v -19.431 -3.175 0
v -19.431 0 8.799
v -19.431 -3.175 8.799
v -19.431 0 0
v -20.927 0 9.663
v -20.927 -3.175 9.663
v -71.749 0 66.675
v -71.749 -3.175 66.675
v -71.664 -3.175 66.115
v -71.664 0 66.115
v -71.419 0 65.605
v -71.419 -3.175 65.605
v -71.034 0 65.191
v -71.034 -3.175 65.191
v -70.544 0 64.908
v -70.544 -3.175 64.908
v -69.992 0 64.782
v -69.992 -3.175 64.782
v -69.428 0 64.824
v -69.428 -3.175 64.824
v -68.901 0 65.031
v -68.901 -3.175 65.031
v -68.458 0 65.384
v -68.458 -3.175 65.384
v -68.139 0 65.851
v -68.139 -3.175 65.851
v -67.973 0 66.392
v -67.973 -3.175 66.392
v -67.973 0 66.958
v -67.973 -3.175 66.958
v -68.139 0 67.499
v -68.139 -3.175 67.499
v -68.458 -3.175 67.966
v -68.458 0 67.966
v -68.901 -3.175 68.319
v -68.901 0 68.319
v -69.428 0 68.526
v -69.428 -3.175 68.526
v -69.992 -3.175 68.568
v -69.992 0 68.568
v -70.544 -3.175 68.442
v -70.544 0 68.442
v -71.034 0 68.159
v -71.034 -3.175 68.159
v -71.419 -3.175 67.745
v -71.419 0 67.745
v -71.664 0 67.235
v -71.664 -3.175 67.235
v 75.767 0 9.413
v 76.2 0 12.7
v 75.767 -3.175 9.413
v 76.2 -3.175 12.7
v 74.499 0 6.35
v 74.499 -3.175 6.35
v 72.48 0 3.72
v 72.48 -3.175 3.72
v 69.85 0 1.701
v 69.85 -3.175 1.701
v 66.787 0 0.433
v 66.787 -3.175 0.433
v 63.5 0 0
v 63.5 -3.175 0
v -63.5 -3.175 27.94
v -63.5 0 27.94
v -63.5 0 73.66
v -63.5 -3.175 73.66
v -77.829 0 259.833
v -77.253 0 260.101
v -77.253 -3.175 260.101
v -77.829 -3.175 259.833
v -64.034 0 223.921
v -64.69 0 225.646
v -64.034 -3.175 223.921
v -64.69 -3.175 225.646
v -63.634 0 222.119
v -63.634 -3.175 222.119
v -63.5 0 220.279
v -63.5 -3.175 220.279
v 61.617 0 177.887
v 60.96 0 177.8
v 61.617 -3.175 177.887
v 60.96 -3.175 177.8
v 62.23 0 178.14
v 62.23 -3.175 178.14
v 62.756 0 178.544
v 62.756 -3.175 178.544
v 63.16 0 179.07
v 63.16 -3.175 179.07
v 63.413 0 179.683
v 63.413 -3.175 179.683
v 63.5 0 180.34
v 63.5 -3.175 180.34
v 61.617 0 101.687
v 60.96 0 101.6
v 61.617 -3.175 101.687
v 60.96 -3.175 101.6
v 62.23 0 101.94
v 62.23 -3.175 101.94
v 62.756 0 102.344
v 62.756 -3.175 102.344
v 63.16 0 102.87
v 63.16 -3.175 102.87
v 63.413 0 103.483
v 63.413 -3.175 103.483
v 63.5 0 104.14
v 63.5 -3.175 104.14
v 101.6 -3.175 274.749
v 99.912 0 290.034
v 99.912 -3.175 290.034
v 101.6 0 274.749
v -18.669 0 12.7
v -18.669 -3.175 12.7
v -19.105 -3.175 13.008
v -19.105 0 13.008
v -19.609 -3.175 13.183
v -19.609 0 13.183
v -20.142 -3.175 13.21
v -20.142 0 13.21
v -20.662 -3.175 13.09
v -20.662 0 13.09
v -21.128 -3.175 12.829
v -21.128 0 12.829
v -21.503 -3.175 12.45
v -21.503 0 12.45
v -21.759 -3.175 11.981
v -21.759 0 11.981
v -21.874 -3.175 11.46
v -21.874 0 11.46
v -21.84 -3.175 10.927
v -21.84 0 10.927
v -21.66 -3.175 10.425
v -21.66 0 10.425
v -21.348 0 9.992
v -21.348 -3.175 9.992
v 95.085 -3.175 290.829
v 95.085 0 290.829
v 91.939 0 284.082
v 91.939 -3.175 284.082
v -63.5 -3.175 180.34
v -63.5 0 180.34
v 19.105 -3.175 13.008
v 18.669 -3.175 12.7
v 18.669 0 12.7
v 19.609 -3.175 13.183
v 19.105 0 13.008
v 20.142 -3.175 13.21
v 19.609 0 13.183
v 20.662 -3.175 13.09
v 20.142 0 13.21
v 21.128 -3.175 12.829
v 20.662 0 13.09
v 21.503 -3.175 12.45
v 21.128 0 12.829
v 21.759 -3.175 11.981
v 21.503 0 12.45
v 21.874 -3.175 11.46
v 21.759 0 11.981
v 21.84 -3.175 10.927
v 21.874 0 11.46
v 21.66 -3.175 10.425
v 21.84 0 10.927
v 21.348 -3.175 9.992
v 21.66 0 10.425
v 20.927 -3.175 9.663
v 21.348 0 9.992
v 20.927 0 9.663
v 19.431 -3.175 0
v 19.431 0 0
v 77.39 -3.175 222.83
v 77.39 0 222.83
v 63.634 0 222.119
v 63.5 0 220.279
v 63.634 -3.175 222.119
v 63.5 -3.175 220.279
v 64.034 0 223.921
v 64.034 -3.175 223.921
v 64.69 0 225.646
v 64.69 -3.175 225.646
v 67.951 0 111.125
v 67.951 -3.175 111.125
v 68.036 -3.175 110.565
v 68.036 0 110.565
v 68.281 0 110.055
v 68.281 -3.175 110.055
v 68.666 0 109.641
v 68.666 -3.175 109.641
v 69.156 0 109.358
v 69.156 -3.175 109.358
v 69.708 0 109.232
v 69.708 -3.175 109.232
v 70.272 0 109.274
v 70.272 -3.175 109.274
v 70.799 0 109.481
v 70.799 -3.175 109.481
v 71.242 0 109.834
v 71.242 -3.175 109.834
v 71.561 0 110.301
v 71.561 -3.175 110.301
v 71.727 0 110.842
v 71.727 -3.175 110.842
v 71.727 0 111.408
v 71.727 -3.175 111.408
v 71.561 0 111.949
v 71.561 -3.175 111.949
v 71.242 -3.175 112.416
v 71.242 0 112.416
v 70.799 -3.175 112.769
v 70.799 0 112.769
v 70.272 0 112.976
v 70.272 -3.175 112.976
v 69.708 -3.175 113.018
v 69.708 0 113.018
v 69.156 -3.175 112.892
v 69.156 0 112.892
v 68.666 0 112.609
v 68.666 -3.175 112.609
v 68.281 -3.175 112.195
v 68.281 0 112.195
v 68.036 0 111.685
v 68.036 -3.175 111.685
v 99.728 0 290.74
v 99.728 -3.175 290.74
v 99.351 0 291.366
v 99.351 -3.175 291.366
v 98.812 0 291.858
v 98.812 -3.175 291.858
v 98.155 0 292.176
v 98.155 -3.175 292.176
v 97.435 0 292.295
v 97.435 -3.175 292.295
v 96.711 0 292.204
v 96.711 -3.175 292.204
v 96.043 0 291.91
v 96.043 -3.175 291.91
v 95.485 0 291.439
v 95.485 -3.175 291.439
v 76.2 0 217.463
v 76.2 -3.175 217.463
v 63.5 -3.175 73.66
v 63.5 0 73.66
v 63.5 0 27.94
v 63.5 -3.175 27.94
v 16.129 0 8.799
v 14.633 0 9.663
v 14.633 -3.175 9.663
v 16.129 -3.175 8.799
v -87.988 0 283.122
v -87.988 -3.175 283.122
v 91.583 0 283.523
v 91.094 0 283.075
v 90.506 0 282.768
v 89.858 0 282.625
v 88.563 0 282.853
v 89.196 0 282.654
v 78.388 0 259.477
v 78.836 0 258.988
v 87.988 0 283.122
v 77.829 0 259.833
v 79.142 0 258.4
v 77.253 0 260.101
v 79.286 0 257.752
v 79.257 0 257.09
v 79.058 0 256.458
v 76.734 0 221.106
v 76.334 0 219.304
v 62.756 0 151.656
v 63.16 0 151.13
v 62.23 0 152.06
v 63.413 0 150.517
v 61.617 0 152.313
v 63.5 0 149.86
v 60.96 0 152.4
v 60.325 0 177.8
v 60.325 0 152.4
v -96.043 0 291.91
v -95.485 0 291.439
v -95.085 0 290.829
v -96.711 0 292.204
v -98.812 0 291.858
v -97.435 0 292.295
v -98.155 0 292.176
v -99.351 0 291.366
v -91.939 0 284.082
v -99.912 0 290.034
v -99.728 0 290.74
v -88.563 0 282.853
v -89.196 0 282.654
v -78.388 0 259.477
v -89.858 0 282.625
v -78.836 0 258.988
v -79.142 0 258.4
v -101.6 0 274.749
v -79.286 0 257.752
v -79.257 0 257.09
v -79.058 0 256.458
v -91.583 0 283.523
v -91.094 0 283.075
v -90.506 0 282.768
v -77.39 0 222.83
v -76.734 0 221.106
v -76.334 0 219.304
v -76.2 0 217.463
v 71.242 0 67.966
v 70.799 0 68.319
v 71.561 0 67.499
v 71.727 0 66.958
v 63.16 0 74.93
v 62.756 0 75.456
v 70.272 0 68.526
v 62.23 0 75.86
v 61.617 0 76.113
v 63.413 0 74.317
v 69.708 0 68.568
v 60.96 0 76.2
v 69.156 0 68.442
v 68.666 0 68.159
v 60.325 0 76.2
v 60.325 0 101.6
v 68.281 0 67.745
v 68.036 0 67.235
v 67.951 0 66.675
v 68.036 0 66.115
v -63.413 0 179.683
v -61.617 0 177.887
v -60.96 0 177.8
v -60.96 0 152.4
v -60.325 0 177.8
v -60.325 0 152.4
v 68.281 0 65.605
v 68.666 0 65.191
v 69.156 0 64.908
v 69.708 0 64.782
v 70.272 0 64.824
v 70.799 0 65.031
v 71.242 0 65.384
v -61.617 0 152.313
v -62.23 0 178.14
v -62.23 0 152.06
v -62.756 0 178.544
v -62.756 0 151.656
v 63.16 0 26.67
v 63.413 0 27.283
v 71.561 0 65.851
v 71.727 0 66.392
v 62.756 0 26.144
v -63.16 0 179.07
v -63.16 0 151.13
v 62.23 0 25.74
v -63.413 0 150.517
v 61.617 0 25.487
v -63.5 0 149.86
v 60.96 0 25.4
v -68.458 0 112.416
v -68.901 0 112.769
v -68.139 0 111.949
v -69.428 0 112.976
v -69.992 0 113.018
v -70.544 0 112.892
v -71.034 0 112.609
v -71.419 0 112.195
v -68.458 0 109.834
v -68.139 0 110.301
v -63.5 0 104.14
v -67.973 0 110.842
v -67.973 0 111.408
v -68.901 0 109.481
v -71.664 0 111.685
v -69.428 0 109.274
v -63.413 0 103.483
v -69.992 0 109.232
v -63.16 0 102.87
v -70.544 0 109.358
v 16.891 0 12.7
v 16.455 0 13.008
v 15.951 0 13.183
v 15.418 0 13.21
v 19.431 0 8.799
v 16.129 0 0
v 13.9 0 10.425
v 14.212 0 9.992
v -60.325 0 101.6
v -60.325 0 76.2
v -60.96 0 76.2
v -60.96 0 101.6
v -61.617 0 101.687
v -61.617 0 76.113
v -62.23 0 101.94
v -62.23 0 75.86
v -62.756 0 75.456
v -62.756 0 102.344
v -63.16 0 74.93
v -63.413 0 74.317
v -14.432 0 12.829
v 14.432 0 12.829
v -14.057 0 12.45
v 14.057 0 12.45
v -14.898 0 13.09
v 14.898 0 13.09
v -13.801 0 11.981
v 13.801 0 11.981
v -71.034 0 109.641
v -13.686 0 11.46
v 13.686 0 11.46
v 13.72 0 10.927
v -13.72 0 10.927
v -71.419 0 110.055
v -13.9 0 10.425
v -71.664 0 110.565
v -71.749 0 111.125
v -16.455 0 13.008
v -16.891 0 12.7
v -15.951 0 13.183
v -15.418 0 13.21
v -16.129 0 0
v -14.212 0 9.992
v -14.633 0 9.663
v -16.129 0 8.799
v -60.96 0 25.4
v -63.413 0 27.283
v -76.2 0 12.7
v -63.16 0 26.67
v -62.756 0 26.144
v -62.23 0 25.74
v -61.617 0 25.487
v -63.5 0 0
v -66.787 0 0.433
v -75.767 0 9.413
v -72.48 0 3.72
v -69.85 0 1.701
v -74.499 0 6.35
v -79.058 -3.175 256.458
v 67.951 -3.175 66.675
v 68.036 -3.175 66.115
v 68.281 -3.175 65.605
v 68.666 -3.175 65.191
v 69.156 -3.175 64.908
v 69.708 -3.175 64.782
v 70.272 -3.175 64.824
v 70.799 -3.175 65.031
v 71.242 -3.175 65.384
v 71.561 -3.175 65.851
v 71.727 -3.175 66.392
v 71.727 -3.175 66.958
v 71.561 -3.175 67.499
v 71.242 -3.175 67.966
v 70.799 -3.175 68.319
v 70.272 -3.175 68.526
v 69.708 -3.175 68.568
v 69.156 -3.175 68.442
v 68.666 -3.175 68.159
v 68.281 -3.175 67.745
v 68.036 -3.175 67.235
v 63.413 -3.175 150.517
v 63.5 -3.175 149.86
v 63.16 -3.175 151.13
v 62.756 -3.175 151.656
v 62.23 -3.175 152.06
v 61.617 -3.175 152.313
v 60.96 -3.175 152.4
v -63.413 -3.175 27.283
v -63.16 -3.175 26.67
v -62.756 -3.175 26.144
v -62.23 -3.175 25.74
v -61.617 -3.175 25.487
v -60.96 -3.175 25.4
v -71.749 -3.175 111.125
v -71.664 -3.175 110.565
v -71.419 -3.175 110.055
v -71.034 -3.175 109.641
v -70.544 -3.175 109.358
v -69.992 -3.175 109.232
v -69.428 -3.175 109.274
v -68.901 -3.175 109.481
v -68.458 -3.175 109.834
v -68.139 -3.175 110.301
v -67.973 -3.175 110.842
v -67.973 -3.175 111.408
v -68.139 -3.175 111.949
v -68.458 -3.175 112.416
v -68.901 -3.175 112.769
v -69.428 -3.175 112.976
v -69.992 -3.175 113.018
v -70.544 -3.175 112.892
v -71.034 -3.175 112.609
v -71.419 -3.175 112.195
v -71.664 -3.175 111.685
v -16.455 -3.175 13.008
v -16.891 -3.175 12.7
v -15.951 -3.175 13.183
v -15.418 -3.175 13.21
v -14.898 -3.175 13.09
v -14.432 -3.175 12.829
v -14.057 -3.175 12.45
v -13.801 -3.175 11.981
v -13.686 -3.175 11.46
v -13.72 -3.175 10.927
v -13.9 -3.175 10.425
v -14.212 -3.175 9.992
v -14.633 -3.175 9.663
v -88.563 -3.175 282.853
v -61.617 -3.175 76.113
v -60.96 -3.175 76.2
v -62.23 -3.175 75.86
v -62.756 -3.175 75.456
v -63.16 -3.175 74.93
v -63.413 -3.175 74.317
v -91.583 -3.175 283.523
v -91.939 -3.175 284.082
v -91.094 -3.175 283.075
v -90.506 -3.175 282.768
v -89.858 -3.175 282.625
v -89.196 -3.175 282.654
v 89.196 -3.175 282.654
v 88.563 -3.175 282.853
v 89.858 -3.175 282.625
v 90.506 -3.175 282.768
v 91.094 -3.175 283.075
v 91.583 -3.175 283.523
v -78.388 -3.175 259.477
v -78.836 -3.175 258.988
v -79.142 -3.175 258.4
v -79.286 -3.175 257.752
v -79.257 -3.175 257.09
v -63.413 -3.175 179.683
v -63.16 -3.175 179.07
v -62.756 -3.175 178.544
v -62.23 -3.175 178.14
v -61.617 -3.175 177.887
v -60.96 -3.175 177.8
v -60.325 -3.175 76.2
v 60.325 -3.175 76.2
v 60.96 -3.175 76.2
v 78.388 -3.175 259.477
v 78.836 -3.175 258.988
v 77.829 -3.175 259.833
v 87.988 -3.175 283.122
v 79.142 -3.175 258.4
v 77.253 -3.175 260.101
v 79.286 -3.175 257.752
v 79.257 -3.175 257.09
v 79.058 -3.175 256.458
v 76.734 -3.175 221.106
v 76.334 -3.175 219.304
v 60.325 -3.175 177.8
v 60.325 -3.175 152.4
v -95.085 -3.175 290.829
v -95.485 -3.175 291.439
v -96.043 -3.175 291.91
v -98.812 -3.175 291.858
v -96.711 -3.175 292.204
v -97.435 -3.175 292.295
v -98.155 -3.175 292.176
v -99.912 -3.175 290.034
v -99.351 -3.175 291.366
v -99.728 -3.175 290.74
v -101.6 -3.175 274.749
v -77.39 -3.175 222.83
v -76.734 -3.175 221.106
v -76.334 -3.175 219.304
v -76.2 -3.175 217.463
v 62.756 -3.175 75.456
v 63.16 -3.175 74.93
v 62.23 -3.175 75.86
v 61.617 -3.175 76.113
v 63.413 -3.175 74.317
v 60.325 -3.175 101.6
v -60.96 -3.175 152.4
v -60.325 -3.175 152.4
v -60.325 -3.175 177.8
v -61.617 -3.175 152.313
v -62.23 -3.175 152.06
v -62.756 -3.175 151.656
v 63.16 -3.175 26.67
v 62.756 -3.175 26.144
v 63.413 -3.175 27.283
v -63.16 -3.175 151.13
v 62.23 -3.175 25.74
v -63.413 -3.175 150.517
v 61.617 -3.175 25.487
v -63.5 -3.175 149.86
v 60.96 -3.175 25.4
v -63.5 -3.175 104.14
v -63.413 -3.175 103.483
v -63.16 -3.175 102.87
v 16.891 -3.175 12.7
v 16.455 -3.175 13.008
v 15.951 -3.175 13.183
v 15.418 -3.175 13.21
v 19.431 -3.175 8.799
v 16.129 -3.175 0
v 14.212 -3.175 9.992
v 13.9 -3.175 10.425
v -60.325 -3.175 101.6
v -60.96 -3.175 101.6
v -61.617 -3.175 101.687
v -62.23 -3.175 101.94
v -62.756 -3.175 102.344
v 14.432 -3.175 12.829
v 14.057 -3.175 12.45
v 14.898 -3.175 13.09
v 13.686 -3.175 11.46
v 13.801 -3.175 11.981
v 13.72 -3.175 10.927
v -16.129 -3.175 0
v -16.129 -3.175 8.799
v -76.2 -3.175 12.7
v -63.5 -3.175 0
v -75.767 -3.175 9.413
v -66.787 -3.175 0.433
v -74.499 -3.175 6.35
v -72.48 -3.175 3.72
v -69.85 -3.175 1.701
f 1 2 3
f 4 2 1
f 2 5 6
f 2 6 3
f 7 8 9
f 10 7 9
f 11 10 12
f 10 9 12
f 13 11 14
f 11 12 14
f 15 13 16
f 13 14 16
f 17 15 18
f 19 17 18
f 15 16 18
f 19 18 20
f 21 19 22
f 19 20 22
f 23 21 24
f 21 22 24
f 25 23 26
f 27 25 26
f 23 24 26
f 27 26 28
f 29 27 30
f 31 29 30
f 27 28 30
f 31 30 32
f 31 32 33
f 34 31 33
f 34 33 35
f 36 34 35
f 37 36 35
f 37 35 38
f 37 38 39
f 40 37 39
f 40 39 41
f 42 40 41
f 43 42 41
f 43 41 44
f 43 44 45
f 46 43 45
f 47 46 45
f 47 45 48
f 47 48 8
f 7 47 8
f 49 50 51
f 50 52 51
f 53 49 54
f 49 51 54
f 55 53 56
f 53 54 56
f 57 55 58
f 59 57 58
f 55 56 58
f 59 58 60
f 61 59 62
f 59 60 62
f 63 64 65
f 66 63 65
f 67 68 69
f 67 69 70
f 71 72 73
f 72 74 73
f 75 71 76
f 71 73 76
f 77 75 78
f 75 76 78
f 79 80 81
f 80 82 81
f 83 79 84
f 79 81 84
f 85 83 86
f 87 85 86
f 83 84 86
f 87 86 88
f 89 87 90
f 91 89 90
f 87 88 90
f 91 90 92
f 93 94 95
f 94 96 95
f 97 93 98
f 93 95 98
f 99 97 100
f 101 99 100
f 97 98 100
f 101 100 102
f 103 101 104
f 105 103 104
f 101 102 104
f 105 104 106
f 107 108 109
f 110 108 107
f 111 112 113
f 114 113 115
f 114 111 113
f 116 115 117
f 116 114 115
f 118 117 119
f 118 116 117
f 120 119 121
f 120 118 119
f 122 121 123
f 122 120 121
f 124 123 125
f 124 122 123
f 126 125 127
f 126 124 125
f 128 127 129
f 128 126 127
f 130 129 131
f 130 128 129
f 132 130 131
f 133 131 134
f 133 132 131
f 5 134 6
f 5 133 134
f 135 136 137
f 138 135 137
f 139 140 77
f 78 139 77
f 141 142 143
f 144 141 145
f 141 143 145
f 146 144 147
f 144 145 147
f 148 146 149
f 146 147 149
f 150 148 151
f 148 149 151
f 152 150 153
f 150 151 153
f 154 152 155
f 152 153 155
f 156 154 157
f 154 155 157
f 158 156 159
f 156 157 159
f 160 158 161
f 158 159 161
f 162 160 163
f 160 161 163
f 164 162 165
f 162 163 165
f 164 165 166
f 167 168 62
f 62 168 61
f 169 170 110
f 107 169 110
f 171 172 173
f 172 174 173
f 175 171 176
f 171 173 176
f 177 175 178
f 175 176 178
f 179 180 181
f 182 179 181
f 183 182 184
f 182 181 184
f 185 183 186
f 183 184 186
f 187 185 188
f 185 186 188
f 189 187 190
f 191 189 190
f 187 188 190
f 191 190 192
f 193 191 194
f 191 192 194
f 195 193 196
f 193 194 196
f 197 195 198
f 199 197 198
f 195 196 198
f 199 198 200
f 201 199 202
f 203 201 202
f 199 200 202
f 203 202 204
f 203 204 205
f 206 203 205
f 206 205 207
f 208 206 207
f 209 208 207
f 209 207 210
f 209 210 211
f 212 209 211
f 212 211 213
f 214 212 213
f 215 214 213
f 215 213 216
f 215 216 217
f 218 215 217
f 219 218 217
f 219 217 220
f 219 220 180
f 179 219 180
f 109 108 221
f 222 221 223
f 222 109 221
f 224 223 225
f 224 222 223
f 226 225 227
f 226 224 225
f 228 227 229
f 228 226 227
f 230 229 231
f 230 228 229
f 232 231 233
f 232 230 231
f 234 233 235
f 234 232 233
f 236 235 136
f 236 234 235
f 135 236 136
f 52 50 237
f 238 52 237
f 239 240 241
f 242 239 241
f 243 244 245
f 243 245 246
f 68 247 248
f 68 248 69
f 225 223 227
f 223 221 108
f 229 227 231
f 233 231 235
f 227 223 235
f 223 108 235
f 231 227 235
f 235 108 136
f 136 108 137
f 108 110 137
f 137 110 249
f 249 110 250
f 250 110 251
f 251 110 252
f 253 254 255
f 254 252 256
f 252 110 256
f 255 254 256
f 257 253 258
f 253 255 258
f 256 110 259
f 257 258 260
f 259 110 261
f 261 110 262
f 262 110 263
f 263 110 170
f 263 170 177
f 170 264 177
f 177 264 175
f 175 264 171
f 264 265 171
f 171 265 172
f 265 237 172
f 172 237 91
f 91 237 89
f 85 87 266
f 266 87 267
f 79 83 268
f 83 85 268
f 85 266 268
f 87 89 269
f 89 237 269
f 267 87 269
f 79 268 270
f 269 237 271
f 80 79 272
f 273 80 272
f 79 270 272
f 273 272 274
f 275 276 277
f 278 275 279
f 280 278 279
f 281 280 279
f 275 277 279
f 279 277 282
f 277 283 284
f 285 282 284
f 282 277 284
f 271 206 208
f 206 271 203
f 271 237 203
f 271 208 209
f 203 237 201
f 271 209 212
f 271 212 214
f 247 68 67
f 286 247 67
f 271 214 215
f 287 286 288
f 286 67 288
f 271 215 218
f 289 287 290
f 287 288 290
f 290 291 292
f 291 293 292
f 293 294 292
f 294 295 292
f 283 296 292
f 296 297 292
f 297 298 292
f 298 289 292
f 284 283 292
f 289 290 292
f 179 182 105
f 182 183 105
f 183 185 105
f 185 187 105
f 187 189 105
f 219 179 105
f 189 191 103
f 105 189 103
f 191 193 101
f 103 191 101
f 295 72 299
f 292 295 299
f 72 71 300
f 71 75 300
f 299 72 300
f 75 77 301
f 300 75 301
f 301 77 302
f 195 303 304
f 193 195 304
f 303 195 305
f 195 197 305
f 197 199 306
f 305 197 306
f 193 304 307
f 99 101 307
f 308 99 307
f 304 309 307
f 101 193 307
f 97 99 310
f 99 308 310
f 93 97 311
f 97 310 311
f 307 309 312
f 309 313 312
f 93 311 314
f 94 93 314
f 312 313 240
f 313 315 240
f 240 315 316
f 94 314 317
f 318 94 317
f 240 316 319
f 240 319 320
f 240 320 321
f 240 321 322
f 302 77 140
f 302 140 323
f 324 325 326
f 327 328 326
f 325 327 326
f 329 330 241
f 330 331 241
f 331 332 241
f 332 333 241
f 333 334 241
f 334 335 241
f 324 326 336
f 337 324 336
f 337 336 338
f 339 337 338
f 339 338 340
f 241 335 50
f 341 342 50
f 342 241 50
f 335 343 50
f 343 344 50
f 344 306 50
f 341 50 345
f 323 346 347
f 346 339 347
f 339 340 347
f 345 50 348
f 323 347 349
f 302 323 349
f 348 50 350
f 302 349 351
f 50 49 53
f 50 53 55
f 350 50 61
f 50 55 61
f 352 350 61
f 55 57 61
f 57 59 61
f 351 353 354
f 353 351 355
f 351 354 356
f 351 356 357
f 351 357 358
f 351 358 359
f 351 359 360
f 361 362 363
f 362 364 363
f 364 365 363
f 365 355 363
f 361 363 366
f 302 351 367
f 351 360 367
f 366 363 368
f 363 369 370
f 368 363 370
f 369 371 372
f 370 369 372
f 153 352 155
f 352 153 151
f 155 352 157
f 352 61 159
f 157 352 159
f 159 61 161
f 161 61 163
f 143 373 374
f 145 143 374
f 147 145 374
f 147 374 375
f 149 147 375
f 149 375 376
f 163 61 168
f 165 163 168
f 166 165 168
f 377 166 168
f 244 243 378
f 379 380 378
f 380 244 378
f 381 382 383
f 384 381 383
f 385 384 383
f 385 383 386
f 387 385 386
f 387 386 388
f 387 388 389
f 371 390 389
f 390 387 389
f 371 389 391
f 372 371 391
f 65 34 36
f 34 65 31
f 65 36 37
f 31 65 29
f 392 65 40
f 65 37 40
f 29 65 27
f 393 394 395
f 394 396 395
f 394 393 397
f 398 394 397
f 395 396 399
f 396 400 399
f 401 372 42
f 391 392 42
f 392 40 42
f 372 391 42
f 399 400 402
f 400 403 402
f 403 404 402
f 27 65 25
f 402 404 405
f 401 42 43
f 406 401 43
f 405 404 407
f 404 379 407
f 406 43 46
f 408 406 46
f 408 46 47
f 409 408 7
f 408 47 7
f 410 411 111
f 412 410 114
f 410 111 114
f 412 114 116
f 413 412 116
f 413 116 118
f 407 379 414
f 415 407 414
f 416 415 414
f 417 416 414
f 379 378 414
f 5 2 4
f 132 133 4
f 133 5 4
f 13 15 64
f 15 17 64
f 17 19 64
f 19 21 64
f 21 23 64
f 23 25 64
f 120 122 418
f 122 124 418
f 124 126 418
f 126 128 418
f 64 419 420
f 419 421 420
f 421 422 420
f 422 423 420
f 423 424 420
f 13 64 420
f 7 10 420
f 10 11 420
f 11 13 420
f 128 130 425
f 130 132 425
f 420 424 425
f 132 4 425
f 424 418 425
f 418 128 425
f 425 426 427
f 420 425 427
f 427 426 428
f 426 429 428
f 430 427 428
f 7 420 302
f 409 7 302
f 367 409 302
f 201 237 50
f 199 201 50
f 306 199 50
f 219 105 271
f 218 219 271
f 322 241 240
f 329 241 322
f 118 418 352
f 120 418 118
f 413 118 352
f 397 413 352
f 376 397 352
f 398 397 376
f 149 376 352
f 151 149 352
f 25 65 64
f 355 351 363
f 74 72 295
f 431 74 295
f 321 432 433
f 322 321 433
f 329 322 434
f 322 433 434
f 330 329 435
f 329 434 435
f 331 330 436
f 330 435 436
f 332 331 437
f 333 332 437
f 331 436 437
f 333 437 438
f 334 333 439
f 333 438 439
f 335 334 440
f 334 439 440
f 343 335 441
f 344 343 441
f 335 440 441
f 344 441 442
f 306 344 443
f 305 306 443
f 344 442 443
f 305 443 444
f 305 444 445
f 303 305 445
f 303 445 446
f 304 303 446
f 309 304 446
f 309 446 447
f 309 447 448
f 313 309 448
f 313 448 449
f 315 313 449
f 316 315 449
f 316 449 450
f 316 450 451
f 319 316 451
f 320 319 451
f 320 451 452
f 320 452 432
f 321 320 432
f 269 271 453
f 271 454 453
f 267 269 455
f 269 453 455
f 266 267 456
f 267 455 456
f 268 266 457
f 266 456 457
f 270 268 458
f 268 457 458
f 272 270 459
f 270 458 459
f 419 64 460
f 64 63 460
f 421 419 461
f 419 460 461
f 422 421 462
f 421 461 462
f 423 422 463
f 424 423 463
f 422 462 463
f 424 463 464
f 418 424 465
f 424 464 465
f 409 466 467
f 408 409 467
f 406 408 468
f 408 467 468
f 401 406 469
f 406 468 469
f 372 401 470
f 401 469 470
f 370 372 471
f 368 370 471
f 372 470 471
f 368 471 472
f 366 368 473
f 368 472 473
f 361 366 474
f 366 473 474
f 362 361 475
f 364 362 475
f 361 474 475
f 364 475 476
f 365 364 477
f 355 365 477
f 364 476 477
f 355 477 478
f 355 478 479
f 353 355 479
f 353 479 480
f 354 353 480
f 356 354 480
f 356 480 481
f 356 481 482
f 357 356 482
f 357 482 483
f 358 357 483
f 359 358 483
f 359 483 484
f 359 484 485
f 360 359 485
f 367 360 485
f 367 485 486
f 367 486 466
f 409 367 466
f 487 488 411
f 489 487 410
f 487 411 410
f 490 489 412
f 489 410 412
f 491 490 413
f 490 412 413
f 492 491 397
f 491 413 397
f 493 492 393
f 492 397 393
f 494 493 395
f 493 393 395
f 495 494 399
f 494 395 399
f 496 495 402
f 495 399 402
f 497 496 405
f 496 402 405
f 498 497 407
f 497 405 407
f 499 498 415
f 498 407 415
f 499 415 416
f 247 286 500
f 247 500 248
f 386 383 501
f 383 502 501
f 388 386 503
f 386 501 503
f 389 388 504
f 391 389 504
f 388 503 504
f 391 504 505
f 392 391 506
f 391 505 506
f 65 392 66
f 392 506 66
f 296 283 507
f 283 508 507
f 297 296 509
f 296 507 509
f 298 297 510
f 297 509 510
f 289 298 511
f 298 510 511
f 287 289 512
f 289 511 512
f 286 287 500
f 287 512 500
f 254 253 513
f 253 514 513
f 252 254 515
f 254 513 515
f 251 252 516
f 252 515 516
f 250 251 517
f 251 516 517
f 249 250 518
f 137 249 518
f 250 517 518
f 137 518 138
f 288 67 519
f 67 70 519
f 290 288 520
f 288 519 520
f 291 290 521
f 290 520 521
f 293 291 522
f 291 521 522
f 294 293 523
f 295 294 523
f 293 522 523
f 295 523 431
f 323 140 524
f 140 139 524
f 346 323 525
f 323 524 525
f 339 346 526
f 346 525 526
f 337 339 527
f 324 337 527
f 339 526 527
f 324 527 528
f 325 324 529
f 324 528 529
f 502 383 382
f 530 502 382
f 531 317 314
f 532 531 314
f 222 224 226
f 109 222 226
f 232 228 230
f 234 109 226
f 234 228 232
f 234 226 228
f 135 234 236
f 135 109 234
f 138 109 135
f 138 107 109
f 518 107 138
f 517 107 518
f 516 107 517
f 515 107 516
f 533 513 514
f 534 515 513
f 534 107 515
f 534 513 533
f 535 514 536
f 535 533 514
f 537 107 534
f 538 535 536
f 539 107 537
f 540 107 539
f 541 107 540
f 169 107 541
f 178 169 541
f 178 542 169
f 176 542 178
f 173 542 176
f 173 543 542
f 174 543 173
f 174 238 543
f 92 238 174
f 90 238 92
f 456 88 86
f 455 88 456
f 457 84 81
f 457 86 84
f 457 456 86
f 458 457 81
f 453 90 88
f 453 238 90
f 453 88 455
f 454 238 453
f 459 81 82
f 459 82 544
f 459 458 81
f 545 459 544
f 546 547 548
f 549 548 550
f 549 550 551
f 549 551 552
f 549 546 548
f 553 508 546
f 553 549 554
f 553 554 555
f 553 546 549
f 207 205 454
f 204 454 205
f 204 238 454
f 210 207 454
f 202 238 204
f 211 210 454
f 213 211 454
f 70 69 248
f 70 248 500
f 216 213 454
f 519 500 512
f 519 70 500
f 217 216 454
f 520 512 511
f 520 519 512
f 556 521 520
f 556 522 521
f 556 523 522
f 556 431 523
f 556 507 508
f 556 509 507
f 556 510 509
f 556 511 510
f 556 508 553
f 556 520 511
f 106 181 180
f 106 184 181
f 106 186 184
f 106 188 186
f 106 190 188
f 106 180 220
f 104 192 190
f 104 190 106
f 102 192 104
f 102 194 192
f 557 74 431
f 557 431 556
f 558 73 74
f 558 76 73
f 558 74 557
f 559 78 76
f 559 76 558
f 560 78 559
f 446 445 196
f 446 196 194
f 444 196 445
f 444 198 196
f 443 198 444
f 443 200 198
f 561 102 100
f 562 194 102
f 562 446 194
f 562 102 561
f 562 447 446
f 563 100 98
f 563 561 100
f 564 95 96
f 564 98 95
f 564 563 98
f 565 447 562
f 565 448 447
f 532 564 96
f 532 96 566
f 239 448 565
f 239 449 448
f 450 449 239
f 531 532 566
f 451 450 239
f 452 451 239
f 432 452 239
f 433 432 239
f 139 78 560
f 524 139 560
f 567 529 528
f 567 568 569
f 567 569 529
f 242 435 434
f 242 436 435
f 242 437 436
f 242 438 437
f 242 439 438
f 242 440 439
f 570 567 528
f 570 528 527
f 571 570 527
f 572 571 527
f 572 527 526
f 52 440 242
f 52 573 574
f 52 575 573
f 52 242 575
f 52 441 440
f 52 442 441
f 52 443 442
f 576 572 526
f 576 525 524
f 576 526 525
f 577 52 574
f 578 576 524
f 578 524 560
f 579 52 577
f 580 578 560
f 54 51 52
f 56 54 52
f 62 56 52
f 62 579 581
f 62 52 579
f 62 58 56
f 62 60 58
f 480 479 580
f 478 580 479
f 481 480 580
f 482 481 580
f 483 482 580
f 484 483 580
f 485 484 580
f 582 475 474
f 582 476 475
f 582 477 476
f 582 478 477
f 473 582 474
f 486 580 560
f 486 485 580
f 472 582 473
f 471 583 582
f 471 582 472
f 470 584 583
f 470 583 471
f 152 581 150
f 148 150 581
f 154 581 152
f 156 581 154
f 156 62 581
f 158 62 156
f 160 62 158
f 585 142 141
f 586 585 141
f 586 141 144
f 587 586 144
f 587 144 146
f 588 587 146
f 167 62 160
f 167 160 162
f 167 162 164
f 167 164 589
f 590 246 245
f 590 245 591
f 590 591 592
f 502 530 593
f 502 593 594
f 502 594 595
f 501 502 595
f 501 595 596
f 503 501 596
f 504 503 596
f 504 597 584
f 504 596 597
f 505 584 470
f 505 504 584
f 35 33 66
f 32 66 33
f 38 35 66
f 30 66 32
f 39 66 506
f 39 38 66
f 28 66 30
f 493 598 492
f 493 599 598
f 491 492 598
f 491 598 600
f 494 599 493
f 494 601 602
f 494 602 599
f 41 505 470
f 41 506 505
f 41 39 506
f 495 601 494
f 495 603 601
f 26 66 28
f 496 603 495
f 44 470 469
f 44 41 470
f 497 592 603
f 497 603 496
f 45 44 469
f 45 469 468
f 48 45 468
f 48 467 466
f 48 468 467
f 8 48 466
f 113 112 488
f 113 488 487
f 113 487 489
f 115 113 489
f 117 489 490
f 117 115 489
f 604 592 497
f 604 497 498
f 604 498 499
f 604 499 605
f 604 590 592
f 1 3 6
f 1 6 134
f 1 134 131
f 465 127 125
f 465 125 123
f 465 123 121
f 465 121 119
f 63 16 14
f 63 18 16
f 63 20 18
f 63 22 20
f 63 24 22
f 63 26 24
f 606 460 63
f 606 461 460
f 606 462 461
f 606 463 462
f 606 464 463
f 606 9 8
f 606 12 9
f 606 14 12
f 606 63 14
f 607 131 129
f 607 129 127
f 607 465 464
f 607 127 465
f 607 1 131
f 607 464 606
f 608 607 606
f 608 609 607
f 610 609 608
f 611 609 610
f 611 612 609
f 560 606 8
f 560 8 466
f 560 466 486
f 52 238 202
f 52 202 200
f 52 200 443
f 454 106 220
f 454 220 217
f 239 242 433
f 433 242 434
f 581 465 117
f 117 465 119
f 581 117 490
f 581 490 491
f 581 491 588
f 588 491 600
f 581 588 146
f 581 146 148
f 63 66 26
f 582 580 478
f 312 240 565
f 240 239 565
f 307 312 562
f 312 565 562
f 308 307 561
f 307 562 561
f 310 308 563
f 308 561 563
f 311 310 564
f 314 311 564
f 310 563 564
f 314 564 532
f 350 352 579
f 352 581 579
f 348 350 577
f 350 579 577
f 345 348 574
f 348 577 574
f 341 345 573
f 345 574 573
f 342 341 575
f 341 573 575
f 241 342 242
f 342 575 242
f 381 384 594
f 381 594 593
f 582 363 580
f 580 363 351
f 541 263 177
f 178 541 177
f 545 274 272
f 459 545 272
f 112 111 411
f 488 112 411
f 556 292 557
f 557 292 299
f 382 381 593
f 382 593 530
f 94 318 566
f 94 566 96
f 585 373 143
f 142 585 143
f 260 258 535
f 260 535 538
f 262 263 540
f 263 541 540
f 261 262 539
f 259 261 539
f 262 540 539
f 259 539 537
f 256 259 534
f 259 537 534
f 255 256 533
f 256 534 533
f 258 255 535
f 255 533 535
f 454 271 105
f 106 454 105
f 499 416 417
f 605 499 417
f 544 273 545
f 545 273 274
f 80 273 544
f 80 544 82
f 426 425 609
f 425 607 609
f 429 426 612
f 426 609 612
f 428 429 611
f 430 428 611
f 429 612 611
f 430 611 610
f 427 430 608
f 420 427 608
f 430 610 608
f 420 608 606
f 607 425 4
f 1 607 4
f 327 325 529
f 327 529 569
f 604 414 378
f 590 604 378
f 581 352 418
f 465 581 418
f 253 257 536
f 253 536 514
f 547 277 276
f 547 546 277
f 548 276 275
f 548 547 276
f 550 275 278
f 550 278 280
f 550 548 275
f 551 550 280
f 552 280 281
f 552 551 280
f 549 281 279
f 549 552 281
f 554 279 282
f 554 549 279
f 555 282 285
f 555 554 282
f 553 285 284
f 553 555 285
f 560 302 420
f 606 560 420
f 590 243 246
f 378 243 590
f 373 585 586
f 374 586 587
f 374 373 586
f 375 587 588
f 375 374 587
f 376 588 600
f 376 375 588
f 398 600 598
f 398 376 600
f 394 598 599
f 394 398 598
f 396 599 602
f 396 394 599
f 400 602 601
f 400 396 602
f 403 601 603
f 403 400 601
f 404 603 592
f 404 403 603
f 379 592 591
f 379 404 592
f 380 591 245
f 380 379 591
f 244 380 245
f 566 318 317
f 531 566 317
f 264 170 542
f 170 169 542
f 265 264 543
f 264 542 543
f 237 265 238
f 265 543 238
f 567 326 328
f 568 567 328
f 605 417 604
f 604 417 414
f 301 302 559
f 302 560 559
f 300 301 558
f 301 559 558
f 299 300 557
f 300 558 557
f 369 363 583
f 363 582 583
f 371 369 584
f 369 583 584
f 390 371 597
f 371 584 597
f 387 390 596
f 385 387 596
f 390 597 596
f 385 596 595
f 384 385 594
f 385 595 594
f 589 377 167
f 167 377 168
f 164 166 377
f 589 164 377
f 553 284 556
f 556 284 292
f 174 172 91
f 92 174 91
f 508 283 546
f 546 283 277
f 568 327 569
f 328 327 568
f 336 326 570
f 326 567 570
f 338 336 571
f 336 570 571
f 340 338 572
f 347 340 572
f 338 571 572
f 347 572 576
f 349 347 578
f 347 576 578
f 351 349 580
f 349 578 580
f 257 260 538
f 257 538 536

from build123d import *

# Parameters (mm, degrees)
BASE_FLANGE1_DEPTH    = 3.175
SKETCH7_W             = 3.302
SKETCH7_H             = 12.7
CUT_EXTRUDE1_DEPTH    = 326.126156068
SKETCH12_W            = 3.175
SKETCH12_H            = 25.4
TAB1_DEPTH            = 3.175
CUT_EXTRUDE2_DEPTH    = 326.126156068
FILLET1_R             = 2.54
CUT_EXTRUDE3_DEPTH    = 316.848888055
FILLET2_R             = 12.7
FILLET3_R             = 2.54
F_6_CLEARANCE_HOLE1_D = 3.7973


# Sheet-metal steps are written as plain solids
with BuildPart() as part:
    # Sketch1 → Base-Flange1 (new body)
    with BuildSketch(Plane(origin=(0, 0, 0), x_dir=(1, 0, 0), z_dir=(0, 1, 0))):
        Polygon((-76.2, 0), (76.2, 0), (76.2, -220.278764113), (113.110108895, -299.432748076), (101.6, -304.8), (63.5, -223.094286329), (63.5, -25.4), (-63.5, -25.4), (-63.5, -223.094286329), (-101.6, -304.8), (-113.110108895, -299.432748076), (-76.2, -220.278764113), align=None)
    extrude(amount=-BASE_FLANGE1_DEPTH)

    # Sketch7 → Cut-Extrude1 (cut, through all)
    with BuildSketch(Plane(origin=(0, 0, 0), x_dir=(1, 0, 0), z_dir=(0, 1, 0))):
        with Locations((-17.78, -6.35)):
            Rectangle(SKETCH7_W, SKETCH7_H)
        with Locations((17.78, -6.35)):
            Rectangle(SKETCH7_W, SKETCH7_H)
    extrude(amount=-CUT_EXTRUDE1_DEPTH, mode=Mode.SUBTRACT)

    # Sketch12 → Tab1 (add)
    with BuildSketch(Plane(origin=(0, 0, 0), x_dir=(1, 0, 0), z_dir=(0, 1, 0))):
        with Locations((-61.9125, -88.9)):
            Rectangle(SKETCH12_W, SKETCH12_H)
        Polygon((-80.130992304, -258.759564419), (-90.865496152, -281.779782209), (-87.987968928, -283.12159519), (-77.25346508, -260.1013774), align=None)
        with Locations((-61.9125, -165.1)):
            Rectangle(SKETCH12_W, SKETCH12_H)
        Polygon((77.25346508, -260.1013774), (87.987968928, -283.12159519), (90.865496152, -281.779782209), (80.130992304, -258.759564419), align=None)
        with Locations((61.9125, -165.1)):
            Rectangle(SKETCH12_W, SKETCH12_H)
        with Locations((61.9125, -88.9)):
            Rectangle(SKETCH12_W, SKETCH12_H)
    extrude(amount=-TAB1_DEPTH)

    # Sketch13 → Cut-Extrude2 (cut, through all)
    with BuildSketch(Plane(origin=(0, 0, 0), x_dir=(1, 0, 0), z_dir=(0, 1, 0))):
        Polygon((-101.6, -304.8), (-98.916374038, -299.044945552), (-101.6, -274.749239894), (-113.110108895, -299.432748076), align=None)
        Polygon((101.6, -304.8), (98.916374038, -299.044945552), (101.6, -274.749239894), (113.110108895, -299.432748076), align=None)
    extrude(amount=-CUT_EXTRUDE2_DEPTH, mode=Mode.SUBTRACT)

    # Fillet1
    fillet1_edges = [part.edges().sort_by_distance(p)[0] for p in [
        (63.5, -1.5875, 152.4),
        (63.5, -1.5875, 177.8),
        (80.130992304, -1.5875, 258.759564419),
        (90.865496152, -1.5875, 281.779782209),
        (-80.130992304, -1.5875, 258.759564419),
        (-90.865496152, -1.5875, 281.779782209),
        (-63.5, -1.5875, 177.8),
        (-63.5, -1.5875, 152.4),
        (-63.5, -1.5875, 101.6),
        (-63.5, -1.5875, 76.2),
        (63.5, -1.5875, 25.4),
        (-63.5, -1.5875, 25.4),
        (63.5, -1.5875, 76.2),
        (63.5, -1.5875, 101.6),
    ]]
    fillet(fillet1_edges, radius=FILLET1_R)

    # Sketch14 → Cut-Extrude3 (cut, through all)
    with BuildSketch(Plane(origin=(0, 0, 0), x_dir=(1, 0, 0), z_dir=(0, 1, 0))):
        with BuildLine():
            Line((-20.927228778, -9.663103241), (-19.431, -8.799255153))
            Line((-19.431, -8.799255153), (-19.431, -9.487125897))
            ThreePointArc((-19.431, -9.487125897), (-19.752208028, -13.204840809), (-20.927228778, -9.663103241))
        make_face()
        with BuildLine():
            Line((-16.129, -8.799255153), (-16.129, -9.487125897))
            ThreePointArc((-16.129, -9.487125897), (-15.807791972, -13.204840809), (-14.632771222, -9.663103241))
            Line((-14.632771222, -9.663103241), (-16.129, -8.799255153))
        make_face()
        with BuildLine():
            Line((19.431, -8.799255153), (19.431, -9.487125897))
            ThreePointArc((19.431, -9.487125897), (19.752208028, -13.204840809), (20.927228778, -9.663103241))
            Line((20.927228778, -9.663103241), (19.431, -8.799255153))
        make_face()
        with BuildLine():
            Line((14.632771222, -9.663103241), (16.129, -8.799255153))
            Line((16.129, -8.799255153), (16.129, -9.487125897))
            ThreePointArc((16.129, -9.487125897), (15.807791972, -13.204840809), (14.632771222, -9.663103241))
        make_face()
    extrude(amount=-CUT_EXTRUDE3_DEPTH, mode=Mode.SUBTRACT)

    # Fillet2
    fillet2_edges = [part.edges().sort_by_distance(p)[0] for p in [
        (76.2, -1.5875, 220.278764113),
        (63.5, -1.5875, 223.094286329),
        (-63.5, -1.5875, 223.094286329),
        (-76.2, -1.5875, 220.278764113),
        (-76.2, -1.5875, 0),
        (76.2, -1.5875, 0),
    ]]
    fillet(fillet2_edges, radius=FILLET2_R)

    # Fillet3
    fillet3_edges = [part.edges().sort_by_distance(p)[0] for p in [
        (-98.916374038, -1.5875, 299.044945552),
        (98.916374038, -1.5875, 299.044945552),
    ]]
    fillet(fillet3_edges, radius=FILLET3_R)

    # #6 Clearance Hole1 (through all)
    with Locations(Plane(origin=(0, 0, 0), x_dir=(1, 0, 0), z_dir=(0, 1, 0))):
        with Locations((69.85, -66.675), (69.85, -111.125), (-69.85, -111.125), (-69.85, -66.675)):
            Hole(F_6_CLEARANCE_HOLE1_D / 2)


solid = part.part
